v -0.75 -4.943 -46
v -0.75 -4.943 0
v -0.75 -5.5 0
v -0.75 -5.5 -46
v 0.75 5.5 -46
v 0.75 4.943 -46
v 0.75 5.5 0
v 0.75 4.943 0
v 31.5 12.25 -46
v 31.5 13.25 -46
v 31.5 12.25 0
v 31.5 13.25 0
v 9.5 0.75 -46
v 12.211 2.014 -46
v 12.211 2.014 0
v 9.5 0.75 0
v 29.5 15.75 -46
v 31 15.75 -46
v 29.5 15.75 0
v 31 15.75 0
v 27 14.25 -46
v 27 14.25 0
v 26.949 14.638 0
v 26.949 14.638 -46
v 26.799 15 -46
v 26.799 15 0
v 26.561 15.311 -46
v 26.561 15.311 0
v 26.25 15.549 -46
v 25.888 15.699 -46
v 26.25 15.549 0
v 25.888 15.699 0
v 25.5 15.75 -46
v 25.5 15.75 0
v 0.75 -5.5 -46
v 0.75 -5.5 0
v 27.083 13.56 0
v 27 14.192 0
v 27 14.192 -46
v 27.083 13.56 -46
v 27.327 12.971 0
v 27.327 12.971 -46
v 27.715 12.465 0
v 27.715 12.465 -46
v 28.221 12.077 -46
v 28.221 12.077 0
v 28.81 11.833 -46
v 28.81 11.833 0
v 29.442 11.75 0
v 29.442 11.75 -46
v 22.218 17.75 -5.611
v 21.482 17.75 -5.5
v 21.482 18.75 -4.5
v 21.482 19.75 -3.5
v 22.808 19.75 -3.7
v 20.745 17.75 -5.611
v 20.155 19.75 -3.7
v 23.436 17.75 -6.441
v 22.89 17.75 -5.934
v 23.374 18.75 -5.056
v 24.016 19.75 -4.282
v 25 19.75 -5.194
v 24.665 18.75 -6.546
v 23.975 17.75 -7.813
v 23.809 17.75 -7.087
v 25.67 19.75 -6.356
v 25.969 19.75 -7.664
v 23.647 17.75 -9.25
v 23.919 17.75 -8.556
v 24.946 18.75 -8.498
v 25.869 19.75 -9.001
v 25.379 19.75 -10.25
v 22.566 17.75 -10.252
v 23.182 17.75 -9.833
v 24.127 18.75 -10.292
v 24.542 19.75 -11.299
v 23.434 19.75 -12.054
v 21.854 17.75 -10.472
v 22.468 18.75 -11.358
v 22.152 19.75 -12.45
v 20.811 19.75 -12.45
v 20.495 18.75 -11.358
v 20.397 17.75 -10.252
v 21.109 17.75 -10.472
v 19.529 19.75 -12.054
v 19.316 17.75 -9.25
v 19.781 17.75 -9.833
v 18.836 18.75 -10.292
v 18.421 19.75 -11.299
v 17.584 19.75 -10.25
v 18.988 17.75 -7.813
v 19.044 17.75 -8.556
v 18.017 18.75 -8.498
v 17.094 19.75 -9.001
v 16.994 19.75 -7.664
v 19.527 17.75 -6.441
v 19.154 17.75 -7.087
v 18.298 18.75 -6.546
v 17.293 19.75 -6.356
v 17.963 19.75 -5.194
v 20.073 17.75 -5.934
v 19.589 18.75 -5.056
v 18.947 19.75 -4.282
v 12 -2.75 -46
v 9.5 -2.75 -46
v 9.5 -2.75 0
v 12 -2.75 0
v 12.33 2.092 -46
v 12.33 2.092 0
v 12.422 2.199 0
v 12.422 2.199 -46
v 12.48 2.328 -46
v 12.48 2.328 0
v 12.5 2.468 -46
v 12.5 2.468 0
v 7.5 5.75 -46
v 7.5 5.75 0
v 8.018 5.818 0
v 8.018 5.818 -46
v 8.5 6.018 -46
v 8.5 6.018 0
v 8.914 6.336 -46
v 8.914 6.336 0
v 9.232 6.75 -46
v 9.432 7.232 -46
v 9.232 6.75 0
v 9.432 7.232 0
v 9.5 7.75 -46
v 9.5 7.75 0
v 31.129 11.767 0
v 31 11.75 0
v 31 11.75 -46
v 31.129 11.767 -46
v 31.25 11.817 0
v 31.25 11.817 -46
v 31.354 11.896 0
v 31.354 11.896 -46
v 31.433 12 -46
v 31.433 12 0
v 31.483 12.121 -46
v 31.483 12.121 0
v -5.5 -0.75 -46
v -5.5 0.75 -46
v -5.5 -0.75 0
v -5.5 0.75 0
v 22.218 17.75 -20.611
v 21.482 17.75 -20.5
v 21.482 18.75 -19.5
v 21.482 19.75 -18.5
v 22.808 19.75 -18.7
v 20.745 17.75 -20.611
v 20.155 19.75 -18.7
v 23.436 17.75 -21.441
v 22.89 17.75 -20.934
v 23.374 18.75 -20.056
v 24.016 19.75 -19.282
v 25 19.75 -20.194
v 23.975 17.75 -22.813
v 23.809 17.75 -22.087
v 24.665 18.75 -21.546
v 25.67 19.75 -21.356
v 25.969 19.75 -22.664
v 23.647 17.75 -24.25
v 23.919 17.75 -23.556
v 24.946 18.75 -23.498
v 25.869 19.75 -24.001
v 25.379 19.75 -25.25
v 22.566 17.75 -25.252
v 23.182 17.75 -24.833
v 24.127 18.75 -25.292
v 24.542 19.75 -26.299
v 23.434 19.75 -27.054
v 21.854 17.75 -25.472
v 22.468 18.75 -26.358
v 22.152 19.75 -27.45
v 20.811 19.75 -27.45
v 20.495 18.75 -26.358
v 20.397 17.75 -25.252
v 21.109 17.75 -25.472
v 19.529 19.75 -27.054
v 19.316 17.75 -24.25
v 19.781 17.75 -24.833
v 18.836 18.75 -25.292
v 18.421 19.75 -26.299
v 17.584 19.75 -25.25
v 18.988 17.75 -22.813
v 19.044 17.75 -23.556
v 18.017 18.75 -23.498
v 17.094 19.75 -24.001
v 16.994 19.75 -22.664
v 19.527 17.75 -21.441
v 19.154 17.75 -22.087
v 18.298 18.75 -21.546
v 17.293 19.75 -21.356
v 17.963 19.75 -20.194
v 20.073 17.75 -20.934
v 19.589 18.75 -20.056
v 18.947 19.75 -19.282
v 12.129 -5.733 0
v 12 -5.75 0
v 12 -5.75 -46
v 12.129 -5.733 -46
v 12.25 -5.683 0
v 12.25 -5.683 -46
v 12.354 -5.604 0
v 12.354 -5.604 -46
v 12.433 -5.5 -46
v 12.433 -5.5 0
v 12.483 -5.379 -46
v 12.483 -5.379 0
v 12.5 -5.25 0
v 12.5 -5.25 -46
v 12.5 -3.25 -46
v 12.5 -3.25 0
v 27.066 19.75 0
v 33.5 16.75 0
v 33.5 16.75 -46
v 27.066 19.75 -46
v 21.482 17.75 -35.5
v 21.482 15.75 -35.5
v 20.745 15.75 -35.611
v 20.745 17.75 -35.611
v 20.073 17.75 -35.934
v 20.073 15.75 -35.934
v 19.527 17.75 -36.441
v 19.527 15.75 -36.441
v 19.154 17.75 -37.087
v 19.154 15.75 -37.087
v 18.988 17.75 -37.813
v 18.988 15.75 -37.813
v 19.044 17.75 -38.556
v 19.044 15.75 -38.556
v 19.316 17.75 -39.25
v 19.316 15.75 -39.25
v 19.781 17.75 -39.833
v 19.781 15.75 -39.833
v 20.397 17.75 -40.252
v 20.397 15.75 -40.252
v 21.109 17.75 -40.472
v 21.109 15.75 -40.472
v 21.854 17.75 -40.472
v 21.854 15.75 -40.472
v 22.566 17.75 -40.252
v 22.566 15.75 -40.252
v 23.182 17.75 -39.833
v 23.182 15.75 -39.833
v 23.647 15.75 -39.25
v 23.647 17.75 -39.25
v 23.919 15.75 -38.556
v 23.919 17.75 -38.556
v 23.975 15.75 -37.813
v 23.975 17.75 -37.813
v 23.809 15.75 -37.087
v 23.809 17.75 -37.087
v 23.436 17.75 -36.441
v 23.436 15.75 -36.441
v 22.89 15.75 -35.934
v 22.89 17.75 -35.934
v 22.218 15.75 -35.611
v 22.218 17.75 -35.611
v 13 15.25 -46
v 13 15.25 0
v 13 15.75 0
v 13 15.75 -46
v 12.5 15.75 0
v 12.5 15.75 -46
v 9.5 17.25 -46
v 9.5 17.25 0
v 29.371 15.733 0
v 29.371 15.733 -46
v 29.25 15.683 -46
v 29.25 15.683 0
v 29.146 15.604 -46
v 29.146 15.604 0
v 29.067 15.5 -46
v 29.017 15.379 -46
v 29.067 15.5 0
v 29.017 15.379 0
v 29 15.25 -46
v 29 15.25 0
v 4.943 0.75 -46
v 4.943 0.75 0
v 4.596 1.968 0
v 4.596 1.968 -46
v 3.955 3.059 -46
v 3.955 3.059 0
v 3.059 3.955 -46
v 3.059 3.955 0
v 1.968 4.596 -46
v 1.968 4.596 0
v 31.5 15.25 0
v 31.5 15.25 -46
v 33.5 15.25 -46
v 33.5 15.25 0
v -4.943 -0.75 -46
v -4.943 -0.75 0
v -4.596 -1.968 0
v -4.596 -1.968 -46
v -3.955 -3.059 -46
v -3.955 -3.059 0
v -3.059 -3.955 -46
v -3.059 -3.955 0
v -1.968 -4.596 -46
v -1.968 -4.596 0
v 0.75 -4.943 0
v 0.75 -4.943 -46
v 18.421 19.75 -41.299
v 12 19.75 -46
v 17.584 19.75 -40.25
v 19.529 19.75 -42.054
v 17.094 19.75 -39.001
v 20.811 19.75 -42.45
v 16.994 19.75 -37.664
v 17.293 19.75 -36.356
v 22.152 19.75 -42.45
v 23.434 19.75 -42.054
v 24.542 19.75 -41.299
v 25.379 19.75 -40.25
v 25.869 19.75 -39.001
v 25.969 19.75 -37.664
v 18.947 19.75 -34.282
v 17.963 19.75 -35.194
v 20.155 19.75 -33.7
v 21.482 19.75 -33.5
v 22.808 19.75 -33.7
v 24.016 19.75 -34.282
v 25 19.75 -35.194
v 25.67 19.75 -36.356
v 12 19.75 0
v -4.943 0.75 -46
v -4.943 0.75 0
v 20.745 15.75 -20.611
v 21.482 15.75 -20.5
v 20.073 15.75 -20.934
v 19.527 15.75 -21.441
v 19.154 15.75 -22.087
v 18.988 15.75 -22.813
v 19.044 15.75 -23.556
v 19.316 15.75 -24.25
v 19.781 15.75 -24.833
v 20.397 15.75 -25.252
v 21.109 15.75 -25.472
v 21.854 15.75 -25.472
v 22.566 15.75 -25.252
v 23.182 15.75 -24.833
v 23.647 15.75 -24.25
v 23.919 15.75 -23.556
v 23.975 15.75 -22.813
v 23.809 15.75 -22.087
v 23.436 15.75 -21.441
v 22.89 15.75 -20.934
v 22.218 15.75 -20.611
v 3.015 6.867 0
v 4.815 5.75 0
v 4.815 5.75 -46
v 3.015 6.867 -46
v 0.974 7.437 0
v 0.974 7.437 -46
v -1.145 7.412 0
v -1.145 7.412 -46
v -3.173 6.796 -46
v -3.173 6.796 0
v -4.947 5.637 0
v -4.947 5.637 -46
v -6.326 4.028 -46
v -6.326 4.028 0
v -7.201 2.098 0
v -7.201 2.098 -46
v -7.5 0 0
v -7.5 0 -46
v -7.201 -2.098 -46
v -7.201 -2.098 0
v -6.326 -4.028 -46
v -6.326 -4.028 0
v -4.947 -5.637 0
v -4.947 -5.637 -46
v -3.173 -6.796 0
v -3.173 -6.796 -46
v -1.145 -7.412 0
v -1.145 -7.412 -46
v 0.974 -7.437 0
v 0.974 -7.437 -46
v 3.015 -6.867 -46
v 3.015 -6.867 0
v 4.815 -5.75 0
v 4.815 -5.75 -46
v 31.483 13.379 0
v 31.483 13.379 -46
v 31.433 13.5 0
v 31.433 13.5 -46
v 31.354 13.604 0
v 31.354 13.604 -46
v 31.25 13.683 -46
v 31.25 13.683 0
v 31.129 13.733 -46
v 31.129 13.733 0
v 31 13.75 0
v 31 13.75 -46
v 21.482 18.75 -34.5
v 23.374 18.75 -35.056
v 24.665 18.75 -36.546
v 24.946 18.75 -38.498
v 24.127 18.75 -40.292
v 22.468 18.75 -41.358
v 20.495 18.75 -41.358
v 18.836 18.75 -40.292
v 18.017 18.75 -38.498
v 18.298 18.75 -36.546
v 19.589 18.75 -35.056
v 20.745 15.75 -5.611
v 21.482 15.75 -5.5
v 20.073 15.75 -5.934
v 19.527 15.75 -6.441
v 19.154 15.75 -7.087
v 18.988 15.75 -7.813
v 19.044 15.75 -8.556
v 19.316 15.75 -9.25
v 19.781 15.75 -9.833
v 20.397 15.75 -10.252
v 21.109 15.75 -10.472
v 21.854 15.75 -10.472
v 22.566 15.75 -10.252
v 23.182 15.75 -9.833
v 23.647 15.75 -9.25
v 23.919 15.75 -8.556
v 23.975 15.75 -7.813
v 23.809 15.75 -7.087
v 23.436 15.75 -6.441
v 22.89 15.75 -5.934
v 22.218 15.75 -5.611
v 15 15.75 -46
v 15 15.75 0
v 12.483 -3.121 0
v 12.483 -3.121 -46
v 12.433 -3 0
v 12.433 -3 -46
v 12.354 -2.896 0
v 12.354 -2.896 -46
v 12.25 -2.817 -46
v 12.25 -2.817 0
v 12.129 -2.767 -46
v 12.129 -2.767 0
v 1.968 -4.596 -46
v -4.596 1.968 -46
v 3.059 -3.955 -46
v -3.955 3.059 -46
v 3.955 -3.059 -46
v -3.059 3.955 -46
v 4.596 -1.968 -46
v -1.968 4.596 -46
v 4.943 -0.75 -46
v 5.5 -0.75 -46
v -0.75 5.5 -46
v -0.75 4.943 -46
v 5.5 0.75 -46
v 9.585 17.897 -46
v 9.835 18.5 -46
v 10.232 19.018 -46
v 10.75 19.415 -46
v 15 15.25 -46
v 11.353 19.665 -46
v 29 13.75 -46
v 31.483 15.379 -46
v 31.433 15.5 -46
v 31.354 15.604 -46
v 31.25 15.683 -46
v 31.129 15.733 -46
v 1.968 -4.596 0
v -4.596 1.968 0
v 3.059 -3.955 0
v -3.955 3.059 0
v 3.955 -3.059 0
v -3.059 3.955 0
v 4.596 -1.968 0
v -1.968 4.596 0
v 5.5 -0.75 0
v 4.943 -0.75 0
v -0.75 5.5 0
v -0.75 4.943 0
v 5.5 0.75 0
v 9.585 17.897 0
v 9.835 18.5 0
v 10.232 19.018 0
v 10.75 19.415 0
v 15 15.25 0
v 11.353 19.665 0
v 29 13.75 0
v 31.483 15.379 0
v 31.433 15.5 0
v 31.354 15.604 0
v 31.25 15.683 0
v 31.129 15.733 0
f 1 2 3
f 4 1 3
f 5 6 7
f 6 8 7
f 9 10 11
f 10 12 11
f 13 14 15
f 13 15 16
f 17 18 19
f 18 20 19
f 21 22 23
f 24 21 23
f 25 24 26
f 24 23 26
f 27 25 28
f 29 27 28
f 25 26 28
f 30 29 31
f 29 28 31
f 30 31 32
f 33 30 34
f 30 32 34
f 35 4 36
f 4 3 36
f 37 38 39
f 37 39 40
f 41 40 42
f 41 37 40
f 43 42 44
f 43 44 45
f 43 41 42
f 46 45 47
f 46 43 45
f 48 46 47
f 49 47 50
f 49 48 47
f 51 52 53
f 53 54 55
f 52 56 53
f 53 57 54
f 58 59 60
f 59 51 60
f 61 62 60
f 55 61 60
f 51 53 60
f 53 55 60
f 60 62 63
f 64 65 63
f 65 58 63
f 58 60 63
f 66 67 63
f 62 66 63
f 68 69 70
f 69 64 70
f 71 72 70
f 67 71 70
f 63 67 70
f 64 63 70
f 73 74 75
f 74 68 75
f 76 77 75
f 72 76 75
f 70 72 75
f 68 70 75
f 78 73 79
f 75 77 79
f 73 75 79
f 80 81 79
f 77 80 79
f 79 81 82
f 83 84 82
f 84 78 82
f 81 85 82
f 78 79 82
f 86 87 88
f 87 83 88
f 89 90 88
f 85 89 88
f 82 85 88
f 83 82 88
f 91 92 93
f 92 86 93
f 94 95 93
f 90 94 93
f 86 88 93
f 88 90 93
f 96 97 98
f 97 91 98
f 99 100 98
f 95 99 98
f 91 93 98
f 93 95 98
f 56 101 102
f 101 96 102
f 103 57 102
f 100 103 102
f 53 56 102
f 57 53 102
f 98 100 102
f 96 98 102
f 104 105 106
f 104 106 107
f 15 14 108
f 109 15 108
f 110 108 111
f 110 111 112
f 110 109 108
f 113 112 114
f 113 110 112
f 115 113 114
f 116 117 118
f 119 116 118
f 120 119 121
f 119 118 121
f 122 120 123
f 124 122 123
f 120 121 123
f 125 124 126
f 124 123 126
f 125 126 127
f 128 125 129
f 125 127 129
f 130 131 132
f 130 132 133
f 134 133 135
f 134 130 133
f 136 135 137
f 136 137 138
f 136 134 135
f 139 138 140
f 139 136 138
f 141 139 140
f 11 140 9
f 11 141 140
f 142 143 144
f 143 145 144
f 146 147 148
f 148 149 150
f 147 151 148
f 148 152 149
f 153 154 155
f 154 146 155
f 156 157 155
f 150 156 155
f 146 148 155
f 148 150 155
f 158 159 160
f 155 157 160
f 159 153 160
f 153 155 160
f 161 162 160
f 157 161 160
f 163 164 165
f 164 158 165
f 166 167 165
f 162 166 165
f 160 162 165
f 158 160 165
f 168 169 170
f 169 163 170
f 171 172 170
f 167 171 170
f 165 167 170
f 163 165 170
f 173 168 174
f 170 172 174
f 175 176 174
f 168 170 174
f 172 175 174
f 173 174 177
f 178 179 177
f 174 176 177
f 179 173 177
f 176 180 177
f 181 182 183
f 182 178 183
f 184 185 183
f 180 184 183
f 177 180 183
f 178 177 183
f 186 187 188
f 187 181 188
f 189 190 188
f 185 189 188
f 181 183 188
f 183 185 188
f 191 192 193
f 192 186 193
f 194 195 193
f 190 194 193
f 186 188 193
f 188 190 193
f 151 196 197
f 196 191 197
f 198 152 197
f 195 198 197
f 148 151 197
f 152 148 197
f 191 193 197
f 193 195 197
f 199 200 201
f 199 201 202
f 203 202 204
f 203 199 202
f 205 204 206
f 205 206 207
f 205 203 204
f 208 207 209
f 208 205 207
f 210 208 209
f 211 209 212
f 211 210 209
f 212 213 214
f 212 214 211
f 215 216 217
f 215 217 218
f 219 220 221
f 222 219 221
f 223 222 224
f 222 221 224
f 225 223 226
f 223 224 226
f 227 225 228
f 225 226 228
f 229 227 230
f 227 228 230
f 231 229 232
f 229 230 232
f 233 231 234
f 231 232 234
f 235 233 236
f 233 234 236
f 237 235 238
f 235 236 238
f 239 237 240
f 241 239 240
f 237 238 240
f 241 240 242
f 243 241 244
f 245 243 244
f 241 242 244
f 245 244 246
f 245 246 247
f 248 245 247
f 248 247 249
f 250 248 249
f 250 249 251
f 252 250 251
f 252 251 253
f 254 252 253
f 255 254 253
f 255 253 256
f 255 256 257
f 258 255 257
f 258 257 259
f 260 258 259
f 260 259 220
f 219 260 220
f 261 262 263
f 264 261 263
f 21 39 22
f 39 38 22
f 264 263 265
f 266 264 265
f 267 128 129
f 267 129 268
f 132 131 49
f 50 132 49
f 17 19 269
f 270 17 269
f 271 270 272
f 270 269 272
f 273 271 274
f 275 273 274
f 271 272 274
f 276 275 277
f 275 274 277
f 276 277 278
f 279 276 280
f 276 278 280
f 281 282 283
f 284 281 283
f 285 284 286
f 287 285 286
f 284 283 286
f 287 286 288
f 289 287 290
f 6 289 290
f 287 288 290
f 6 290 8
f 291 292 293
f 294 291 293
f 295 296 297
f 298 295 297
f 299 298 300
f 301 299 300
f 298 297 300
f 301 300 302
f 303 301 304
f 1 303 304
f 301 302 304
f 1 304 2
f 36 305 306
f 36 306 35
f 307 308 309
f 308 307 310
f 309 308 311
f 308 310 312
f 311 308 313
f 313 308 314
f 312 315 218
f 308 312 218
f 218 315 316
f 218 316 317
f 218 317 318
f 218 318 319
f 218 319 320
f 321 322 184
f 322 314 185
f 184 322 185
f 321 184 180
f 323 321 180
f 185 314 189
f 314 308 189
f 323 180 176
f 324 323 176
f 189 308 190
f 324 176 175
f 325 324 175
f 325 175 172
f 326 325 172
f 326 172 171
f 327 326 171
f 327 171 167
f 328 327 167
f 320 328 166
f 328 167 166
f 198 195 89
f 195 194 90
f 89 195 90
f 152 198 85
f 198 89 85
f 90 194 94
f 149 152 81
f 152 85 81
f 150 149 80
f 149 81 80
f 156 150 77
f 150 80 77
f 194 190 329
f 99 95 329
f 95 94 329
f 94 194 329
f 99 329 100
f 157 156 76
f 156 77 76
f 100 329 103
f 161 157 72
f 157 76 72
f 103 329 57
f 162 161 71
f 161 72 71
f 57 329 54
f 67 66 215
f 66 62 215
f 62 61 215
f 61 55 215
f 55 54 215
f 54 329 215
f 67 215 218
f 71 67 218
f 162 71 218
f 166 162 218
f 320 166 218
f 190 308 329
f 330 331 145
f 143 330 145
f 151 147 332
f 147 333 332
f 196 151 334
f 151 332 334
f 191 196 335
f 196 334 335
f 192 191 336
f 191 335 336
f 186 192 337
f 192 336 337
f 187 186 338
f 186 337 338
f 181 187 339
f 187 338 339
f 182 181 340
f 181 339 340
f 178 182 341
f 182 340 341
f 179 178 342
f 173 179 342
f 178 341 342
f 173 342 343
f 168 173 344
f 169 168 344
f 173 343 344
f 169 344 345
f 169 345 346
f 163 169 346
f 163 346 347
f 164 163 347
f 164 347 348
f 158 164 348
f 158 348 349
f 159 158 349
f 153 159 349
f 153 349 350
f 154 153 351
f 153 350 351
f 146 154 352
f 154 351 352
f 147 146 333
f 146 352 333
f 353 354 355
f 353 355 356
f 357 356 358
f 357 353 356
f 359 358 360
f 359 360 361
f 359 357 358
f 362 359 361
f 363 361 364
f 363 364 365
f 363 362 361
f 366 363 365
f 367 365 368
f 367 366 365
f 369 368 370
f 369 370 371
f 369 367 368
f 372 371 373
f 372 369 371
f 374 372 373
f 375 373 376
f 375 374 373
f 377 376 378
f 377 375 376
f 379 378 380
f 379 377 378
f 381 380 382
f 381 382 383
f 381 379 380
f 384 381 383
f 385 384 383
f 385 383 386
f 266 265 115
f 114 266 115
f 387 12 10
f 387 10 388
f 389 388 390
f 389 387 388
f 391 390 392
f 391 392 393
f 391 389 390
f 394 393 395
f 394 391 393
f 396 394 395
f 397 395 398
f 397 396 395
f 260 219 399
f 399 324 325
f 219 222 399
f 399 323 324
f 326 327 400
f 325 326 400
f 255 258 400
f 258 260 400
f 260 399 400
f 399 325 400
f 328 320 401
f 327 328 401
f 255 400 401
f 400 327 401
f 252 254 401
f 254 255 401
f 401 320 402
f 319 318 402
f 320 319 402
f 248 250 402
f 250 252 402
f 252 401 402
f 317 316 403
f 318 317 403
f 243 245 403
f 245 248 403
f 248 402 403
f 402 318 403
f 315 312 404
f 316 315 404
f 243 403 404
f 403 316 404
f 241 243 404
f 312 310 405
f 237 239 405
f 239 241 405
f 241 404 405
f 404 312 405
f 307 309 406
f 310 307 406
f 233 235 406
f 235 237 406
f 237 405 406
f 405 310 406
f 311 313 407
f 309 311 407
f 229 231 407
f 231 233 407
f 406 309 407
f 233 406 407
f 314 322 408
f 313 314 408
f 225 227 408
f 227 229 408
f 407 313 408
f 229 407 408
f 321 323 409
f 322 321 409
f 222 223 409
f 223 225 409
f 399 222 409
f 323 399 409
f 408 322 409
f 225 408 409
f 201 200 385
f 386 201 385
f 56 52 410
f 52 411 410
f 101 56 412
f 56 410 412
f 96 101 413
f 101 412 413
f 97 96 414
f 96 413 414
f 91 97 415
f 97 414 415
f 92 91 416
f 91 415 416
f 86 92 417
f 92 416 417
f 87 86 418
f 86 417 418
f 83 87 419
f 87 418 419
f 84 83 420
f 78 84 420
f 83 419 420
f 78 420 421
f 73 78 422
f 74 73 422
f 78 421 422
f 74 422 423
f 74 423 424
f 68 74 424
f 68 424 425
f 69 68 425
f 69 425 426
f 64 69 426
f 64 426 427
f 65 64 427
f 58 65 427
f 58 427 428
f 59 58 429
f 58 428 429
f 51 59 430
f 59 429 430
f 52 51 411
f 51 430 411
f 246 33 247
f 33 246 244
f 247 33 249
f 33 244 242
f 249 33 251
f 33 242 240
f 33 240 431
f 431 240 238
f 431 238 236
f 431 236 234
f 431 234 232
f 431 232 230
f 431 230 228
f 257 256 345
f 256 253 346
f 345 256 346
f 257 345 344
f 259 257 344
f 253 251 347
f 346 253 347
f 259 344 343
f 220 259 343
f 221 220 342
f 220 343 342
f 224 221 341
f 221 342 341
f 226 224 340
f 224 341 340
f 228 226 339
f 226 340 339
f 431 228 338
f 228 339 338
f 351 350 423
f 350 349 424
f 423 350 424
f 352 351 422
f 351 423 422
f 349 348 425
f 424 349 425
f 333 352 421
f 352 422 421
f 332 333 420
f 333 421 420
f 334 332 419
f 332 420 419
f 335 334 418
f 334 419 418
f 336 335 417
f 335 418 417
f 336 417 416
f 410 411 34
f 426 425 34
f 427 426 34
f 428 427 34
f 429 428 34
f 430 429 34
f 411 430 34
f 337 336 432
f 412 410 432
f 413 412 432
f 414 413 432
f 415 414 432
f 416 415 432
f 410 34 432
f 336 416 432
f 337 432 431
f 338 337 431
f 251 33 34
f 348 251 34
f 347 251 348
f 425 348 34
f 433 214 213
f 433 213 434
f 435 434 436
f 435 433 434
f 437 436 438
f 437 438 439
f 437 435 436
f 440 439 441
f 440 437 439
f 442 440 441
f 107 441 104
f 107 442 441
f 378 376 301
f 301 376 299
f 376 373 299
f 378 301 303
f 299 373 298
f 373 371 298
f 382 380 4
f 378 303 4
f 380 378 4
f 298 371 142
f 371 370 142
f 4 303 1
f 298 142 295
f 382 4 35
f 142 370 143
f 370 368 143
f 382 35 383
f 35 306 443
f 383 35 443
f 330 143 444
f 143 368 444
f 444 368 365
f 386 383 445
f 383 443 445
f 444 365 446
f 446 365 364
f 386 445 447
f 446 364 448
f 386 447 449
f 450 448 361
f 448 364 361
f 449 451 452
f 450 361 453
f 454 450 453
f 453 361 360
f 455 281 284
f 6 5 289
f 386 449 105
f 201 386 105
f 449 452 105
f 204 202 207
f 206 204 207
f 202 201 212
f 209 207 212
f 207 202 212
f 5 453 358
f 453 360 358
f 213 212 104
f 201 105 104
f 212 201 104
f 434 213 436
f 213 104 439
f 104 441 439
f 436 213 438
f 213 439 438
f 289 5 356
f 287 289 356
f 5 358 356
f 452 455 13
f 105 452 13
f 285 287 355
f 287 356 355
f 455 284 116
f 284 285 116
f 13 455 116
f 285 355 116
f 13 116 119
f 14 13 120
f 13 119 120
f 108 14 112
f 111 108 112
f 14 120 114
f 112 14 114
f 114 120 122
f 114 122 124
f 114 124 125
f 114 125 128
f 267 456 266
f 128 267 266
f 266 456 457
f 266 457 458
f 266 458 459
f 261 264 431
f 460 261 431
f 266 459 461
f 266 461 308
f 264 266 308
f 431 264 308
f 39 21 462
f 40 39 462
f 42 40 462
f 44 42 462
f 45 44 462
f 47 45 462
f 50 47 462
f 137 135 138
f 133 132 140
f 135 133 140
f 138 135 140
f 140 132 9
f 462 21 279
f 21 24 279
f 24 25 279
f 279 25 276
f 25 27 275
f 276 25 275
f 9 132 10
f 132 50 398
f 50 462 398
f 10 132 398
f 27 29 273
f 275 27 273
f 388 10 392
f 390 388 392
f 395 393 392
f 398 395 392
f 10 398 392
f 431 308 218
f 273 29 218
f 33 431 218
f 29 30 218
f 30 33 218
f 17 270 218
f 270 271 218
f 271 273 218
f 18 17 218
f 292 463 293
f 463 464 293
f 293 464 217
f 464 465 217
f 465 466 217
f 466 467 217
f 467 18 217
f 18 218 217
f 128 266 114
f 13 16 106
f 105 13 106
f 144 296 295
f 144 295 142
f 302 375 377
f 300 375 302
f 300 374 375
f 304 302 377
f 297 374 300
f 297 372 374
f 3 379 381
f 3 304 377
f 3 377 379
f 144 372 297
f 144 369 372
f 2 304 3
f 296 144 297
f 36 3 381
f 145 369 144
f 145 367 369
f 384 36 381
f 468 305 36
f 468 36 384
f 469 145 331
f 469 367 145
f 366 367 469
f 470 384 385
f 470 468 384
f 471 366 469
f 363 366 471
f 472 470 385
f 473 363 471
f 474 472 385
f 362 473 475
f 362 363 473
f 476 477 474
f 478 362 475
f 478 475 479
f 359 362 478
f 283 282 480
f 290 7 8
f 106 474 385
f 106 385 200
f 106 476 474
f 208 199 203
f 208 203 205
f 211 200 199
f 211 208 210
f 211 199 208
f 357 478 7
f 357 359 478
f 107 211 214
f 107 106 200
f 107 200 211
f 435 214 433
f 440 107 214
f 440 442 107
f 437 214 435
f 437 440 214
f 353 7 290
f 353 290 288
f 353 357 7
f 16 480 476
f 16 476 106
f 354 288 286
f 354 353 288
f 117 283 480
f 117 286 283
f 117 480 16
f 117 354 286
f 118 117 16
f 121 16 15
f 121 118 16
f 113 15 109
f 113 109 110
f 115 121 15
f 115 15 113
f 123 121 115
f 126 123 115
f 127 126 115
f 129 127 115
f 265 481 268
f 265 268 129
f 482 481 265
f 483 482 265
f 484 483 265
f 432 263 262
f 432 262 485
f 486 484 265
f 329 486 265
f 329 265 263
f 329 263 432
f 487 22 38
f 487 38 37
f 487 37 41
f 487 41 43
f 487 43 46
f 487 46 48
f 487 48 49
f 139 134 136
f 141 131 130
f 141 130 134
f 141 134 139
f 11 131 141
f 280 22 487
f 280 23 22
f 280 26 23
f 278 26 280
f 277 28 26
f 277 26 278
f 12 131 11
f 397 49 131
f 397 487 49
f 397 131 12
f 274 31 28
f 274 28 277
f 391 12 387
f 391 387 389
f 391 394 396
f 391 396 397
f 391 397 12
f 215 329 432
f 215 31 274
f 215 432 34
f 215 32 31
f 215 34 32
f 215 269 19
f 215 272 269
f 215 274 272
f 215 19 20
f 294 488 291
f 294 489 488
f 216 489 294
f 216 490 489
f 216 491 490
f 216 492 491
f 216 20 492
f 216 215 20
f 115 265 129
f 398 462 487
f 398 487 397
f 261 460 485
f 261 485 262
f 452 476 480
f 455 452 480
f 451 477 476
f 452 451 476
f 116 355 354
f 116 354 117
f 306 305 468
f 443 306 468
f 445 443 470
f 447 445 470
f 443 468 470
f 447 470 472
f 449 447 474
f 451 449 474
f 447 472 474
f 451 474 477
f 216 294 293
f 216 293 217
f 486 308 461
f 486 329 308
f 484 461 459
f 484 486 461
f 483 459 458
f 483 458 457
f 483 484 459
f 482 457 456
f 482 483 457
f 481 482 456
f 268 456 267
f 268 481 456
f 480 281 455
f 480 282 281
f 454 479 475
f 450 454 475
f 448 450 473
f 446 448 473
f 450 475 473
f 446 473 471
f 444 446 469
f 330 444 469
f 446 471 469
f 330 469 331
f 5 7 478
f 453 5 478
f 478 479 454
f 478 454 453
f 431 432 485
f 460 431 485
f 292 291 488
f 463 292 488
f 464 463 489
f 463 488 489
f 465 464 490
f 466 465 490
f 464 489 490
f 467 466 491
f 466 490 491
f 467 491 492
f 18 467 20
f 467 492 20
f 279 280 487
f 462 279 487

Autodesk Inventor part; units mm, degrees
ref_plane "YZ Plane" through (0, 0, 0) normal (1, 0, 0) x (0, 1, 0)
ref_plane "XZ Plane" through (0, 0, 0) normal (0, 1, 0) x (-1, 0, 0)
ref_plane "XY Plane" through (0, 0, 0) normal (0, 0, 1) x (1, 0, 0)
sketch "Boceto1" plane through (0, 0, 0) normal (0, 0, 1) x (1, 0, 0)
  arc A0 (4.8153, 5.75) -> (4.8153, -5.75) centre (0, 0) ccw
  line L0 (0, 12.1119) -> (0, -11.4197) construction
  line L1 (-11.1817, 0) -> (12.1806, 0) construction
  line L2 (4.9434, 0.75) -> (5.5, 0.75)
  line L3 (4.9434, -0.75) -> (5.5, -0.75)
  line L4 (5.5, -0.75) -> (5.5, 0.75)
  line L5 (-0.75, 4.9434) -> (-0.75, 5.5)
  line L6 (0.75, 5.5) -> (-0.75, 5.5)
  line L7 (0.75, 4.9434) -> (0.75, 5.5)
  line L8 (-4.9434, -0.75) -> (-5.5, -0.75)
  line L9 (-5.5, 0.75) -> (-5.5, -0.75)
  line L10 (-4.9434, 0.75) -> (-5.5, 0.75)
  line L11 (0.75, -4.9434) -> (0.75, -5.5)
  line L12 (-0.75, -5.5) -> (0.75, -5.5)
  line L13 (-0.75, -4.9434) -> (-0.75, -5.5)
  arc A1 (-0.75, 4.9434) -> (-4.9434, 0.75) centre (0, 0) ccw
  arc A2 (-4.9434, -0.75) -> (-0.75, -4.9434) centre (0, 0) ccw
  arc A3 (0.75, -4.9434) -> (4.9434, -0.75) centre (0, 0) ccw
  arc A4 (4.9434, 0.75) -> (0.75, 4.9434) centre (0, 0) ccw
  circle A5 centre (0, 0) radius 5 construction
  line L14 (-11.772, 7.5) -> (14.517, 7.5) construction
  line L15 (-11.772, -7.5) -> (14.517, -7.5) construction
  line L16 (4.8153, 5.75) -> (7.5, 5.75)
  line L17 (9.5, 7.75) -> (9.5, 17.25)
  line L18 (12, 19.75) -> (27.0665, 19.75)
  line L19 (31.5, 15.25) -> (31.5, 15.25)
  line L20 (31, 15.75) -> (29.5, 15.75)
  line L21 (29, 15.25) -> (29, 13.75)
  line L22 (29, 13.75) -> (31, 13.75)
  line L23 (31.5, 13.25) -> (31.5, 12.25)
  line L24 (31, 11.75) -> (29.4417, 11.75)
  line L25 (27, 14.1917) -> (27, 14.25)
  line L26 (25.5, 15.75) -> (15, 15.75)
  line L27 (15, 15.75) -> (15, 15.25)
  line L28 (15, 15.25) -> (13, 15.25)
  line L29 (13, 15.25) -> (13, 15.75)
  line L30 (13, 15.75) -> (12.5, 15.75)
  line L31 (12.5, 15.75) -> (12.5, 2.4675)
  line L32 (12.2113, 2.0143) -> (9.5, 0.75)
  line L33 (9.5, 0.75) -> (9.5, -2.75)
  line L34 (9.5, -2.75) -> (12, -2.75)
  line L35 (12.5, -3.25) -> (12.5, -5.25)
  line L36 (12, -5.75) -> (4.8153, -5.75)
  line L37 (33.5, 15.25) -> (33.5, 16.75)
  line L38 (31.5, 15.25) -> (33.5, 15.25)
  arc A6 (31, 11.75) -> (31.5, 12.25) centre (31, 12.25) ccw
  arc A7 (31.5, 13.25) -> (31, 13.75) centre (31, 13.25) ccw
  arc A8 (31.5, 15.25) -> (31, 15.75) centre (31, 15.25) ccw
  arc A9 (29.5, 15.75) -> (29, 15.25) centre (29.5, 15.25) ccw
  arc A10 (27, 14.25) -> (25.5, 15.75) centre (25.5, 14.25) ccw
  arc A11 (27, 14.1917) -> (29.4417, 11.75) centre (29.4417, 14.1917) ccw
  arc A12 (12, 19.75) -> (9.5, 17.25) centre (12, 17.25) ccw
  arc A13 (12.2113, 2.0143) -> (12.5, 2.4675) centre (12, 2.4675) ccw
  arc A14 (12.5, -3.25) -> (12, -2.75) centre (12, -3.25) ccw
  arc A15 (12, -5.75) -> (12.5, -5.25) centre (12, -5.25) ccw
  arc A16 (7.5, 5.75) -> (9.5, 7.75) centre (7.5, 7.75) ccw
  line L39 (33.5, 16.75) -> (27.0665, 19.75)
  point P0 (31.5, 13.75)
  point P1 (31.5, 11.75)
  point P2 (27, 11.75)
  point P3 (27, 15.75)
  point P4 (12.5, -2.75)
  point P5 (12.5, -5.75)
  point P6 (-7.5, 0)
  point P7 (5.5, 0)
  dimension "d0" = 15
  dimension "d4" = 0.75
  dimension "d6" = 1.5
  dimension "d11" = 360
  dimension "d13" = 10
  dimension "d14" = 0.5
  dimension "d15" = 5
  dimension "d16" = 1.75
  dimension "d17" = 1.75
  dimension "d18" = 11.5
  dimension "d20" = 3
  dimension "d21" = 3
  dimension "d22" = 3
  dimension "d23" = 4
  dimension "d24" = 115
  dimension "d26" = 19
  dimension "d27" = 14
  dimension "d28" = 0.5
  dimension "d30" = 0.5
  dimension "d31" = 8
  dimension "d33" = 0.5
  dimension "d36" = 2
  dimension "d41" = 65
  dimension "d43" = 0.5
  dimension "d44" = 0.5
  dimension "d45" = 1.5
  dimension "d47" = 2.5
  dimension "d48" = 0.5
  dimension "d49" = 2
  dimension "d88" = 20
  dimension "d89" = 4
  dimension "d92" = 27.25
  dimension "d93" = 2
  dimension "d94" = 2
  dimension "d95" = 14.5
  dimension "d96" = 2.4417
  dimension "d98" = 155
  dimension "d99" = 2
  dimension "d101" = 1.5
  dimension "d102" = 2.5
  dimension "d103" = 24
extrude "Extrusión1" add sketch "Boceto1" against normal blind 46
sketch "Boceto2" plane through (12, 19.75, 0) normal (0, 1, 0) x (1, 0, 0)
  line L0 (9.4815, 49.0857) -> (9.4815, -3.1706) construction
  line L1 (20.8474, 23) -> (-1.8844, 23) construction
  line L2 (0, 0) -> (0, 46) construction
  line L3 (15.0665, 0) -> (0, 0) construction
  line L4 (0, 46) -> (15.0665, 46) construction
  circle A0 centre (9.4815, 23) radius 2.5
  circle A1 centre (9.4815, 23) radius 4.5
  circle A2 centre (9.4815, 8) radius 2.5
  circle A3 centre (9.4815, 8) radius 4.5
  circle A4 centre (9.4815, 38) radius 2.5
  circle A5 centre (9.4815, 38) radius 4.5
  line L5 (15.0665, 0) -> (15.0665, 46) projected
  point P0 (-12, 0)
  dimension "d67" = 23
  dimension "d68" = 23
  dimension "d69" = 5
  dimension "d70" = 9
  dimension "d72" = 2
  dimension "d75" = 15
  dimension "d104" = 5.585
hole "Agujero1" at (21.4815, 19.75, -38) at (21.4815, 19.75, -23) at (21.4815, 19.75, -8) direction (0, -1, 0) diameter 5 end through all countersink diameter 9 countersink angle 90
properties part number "HIN-61 BISAGRA" material "Aluminio"
